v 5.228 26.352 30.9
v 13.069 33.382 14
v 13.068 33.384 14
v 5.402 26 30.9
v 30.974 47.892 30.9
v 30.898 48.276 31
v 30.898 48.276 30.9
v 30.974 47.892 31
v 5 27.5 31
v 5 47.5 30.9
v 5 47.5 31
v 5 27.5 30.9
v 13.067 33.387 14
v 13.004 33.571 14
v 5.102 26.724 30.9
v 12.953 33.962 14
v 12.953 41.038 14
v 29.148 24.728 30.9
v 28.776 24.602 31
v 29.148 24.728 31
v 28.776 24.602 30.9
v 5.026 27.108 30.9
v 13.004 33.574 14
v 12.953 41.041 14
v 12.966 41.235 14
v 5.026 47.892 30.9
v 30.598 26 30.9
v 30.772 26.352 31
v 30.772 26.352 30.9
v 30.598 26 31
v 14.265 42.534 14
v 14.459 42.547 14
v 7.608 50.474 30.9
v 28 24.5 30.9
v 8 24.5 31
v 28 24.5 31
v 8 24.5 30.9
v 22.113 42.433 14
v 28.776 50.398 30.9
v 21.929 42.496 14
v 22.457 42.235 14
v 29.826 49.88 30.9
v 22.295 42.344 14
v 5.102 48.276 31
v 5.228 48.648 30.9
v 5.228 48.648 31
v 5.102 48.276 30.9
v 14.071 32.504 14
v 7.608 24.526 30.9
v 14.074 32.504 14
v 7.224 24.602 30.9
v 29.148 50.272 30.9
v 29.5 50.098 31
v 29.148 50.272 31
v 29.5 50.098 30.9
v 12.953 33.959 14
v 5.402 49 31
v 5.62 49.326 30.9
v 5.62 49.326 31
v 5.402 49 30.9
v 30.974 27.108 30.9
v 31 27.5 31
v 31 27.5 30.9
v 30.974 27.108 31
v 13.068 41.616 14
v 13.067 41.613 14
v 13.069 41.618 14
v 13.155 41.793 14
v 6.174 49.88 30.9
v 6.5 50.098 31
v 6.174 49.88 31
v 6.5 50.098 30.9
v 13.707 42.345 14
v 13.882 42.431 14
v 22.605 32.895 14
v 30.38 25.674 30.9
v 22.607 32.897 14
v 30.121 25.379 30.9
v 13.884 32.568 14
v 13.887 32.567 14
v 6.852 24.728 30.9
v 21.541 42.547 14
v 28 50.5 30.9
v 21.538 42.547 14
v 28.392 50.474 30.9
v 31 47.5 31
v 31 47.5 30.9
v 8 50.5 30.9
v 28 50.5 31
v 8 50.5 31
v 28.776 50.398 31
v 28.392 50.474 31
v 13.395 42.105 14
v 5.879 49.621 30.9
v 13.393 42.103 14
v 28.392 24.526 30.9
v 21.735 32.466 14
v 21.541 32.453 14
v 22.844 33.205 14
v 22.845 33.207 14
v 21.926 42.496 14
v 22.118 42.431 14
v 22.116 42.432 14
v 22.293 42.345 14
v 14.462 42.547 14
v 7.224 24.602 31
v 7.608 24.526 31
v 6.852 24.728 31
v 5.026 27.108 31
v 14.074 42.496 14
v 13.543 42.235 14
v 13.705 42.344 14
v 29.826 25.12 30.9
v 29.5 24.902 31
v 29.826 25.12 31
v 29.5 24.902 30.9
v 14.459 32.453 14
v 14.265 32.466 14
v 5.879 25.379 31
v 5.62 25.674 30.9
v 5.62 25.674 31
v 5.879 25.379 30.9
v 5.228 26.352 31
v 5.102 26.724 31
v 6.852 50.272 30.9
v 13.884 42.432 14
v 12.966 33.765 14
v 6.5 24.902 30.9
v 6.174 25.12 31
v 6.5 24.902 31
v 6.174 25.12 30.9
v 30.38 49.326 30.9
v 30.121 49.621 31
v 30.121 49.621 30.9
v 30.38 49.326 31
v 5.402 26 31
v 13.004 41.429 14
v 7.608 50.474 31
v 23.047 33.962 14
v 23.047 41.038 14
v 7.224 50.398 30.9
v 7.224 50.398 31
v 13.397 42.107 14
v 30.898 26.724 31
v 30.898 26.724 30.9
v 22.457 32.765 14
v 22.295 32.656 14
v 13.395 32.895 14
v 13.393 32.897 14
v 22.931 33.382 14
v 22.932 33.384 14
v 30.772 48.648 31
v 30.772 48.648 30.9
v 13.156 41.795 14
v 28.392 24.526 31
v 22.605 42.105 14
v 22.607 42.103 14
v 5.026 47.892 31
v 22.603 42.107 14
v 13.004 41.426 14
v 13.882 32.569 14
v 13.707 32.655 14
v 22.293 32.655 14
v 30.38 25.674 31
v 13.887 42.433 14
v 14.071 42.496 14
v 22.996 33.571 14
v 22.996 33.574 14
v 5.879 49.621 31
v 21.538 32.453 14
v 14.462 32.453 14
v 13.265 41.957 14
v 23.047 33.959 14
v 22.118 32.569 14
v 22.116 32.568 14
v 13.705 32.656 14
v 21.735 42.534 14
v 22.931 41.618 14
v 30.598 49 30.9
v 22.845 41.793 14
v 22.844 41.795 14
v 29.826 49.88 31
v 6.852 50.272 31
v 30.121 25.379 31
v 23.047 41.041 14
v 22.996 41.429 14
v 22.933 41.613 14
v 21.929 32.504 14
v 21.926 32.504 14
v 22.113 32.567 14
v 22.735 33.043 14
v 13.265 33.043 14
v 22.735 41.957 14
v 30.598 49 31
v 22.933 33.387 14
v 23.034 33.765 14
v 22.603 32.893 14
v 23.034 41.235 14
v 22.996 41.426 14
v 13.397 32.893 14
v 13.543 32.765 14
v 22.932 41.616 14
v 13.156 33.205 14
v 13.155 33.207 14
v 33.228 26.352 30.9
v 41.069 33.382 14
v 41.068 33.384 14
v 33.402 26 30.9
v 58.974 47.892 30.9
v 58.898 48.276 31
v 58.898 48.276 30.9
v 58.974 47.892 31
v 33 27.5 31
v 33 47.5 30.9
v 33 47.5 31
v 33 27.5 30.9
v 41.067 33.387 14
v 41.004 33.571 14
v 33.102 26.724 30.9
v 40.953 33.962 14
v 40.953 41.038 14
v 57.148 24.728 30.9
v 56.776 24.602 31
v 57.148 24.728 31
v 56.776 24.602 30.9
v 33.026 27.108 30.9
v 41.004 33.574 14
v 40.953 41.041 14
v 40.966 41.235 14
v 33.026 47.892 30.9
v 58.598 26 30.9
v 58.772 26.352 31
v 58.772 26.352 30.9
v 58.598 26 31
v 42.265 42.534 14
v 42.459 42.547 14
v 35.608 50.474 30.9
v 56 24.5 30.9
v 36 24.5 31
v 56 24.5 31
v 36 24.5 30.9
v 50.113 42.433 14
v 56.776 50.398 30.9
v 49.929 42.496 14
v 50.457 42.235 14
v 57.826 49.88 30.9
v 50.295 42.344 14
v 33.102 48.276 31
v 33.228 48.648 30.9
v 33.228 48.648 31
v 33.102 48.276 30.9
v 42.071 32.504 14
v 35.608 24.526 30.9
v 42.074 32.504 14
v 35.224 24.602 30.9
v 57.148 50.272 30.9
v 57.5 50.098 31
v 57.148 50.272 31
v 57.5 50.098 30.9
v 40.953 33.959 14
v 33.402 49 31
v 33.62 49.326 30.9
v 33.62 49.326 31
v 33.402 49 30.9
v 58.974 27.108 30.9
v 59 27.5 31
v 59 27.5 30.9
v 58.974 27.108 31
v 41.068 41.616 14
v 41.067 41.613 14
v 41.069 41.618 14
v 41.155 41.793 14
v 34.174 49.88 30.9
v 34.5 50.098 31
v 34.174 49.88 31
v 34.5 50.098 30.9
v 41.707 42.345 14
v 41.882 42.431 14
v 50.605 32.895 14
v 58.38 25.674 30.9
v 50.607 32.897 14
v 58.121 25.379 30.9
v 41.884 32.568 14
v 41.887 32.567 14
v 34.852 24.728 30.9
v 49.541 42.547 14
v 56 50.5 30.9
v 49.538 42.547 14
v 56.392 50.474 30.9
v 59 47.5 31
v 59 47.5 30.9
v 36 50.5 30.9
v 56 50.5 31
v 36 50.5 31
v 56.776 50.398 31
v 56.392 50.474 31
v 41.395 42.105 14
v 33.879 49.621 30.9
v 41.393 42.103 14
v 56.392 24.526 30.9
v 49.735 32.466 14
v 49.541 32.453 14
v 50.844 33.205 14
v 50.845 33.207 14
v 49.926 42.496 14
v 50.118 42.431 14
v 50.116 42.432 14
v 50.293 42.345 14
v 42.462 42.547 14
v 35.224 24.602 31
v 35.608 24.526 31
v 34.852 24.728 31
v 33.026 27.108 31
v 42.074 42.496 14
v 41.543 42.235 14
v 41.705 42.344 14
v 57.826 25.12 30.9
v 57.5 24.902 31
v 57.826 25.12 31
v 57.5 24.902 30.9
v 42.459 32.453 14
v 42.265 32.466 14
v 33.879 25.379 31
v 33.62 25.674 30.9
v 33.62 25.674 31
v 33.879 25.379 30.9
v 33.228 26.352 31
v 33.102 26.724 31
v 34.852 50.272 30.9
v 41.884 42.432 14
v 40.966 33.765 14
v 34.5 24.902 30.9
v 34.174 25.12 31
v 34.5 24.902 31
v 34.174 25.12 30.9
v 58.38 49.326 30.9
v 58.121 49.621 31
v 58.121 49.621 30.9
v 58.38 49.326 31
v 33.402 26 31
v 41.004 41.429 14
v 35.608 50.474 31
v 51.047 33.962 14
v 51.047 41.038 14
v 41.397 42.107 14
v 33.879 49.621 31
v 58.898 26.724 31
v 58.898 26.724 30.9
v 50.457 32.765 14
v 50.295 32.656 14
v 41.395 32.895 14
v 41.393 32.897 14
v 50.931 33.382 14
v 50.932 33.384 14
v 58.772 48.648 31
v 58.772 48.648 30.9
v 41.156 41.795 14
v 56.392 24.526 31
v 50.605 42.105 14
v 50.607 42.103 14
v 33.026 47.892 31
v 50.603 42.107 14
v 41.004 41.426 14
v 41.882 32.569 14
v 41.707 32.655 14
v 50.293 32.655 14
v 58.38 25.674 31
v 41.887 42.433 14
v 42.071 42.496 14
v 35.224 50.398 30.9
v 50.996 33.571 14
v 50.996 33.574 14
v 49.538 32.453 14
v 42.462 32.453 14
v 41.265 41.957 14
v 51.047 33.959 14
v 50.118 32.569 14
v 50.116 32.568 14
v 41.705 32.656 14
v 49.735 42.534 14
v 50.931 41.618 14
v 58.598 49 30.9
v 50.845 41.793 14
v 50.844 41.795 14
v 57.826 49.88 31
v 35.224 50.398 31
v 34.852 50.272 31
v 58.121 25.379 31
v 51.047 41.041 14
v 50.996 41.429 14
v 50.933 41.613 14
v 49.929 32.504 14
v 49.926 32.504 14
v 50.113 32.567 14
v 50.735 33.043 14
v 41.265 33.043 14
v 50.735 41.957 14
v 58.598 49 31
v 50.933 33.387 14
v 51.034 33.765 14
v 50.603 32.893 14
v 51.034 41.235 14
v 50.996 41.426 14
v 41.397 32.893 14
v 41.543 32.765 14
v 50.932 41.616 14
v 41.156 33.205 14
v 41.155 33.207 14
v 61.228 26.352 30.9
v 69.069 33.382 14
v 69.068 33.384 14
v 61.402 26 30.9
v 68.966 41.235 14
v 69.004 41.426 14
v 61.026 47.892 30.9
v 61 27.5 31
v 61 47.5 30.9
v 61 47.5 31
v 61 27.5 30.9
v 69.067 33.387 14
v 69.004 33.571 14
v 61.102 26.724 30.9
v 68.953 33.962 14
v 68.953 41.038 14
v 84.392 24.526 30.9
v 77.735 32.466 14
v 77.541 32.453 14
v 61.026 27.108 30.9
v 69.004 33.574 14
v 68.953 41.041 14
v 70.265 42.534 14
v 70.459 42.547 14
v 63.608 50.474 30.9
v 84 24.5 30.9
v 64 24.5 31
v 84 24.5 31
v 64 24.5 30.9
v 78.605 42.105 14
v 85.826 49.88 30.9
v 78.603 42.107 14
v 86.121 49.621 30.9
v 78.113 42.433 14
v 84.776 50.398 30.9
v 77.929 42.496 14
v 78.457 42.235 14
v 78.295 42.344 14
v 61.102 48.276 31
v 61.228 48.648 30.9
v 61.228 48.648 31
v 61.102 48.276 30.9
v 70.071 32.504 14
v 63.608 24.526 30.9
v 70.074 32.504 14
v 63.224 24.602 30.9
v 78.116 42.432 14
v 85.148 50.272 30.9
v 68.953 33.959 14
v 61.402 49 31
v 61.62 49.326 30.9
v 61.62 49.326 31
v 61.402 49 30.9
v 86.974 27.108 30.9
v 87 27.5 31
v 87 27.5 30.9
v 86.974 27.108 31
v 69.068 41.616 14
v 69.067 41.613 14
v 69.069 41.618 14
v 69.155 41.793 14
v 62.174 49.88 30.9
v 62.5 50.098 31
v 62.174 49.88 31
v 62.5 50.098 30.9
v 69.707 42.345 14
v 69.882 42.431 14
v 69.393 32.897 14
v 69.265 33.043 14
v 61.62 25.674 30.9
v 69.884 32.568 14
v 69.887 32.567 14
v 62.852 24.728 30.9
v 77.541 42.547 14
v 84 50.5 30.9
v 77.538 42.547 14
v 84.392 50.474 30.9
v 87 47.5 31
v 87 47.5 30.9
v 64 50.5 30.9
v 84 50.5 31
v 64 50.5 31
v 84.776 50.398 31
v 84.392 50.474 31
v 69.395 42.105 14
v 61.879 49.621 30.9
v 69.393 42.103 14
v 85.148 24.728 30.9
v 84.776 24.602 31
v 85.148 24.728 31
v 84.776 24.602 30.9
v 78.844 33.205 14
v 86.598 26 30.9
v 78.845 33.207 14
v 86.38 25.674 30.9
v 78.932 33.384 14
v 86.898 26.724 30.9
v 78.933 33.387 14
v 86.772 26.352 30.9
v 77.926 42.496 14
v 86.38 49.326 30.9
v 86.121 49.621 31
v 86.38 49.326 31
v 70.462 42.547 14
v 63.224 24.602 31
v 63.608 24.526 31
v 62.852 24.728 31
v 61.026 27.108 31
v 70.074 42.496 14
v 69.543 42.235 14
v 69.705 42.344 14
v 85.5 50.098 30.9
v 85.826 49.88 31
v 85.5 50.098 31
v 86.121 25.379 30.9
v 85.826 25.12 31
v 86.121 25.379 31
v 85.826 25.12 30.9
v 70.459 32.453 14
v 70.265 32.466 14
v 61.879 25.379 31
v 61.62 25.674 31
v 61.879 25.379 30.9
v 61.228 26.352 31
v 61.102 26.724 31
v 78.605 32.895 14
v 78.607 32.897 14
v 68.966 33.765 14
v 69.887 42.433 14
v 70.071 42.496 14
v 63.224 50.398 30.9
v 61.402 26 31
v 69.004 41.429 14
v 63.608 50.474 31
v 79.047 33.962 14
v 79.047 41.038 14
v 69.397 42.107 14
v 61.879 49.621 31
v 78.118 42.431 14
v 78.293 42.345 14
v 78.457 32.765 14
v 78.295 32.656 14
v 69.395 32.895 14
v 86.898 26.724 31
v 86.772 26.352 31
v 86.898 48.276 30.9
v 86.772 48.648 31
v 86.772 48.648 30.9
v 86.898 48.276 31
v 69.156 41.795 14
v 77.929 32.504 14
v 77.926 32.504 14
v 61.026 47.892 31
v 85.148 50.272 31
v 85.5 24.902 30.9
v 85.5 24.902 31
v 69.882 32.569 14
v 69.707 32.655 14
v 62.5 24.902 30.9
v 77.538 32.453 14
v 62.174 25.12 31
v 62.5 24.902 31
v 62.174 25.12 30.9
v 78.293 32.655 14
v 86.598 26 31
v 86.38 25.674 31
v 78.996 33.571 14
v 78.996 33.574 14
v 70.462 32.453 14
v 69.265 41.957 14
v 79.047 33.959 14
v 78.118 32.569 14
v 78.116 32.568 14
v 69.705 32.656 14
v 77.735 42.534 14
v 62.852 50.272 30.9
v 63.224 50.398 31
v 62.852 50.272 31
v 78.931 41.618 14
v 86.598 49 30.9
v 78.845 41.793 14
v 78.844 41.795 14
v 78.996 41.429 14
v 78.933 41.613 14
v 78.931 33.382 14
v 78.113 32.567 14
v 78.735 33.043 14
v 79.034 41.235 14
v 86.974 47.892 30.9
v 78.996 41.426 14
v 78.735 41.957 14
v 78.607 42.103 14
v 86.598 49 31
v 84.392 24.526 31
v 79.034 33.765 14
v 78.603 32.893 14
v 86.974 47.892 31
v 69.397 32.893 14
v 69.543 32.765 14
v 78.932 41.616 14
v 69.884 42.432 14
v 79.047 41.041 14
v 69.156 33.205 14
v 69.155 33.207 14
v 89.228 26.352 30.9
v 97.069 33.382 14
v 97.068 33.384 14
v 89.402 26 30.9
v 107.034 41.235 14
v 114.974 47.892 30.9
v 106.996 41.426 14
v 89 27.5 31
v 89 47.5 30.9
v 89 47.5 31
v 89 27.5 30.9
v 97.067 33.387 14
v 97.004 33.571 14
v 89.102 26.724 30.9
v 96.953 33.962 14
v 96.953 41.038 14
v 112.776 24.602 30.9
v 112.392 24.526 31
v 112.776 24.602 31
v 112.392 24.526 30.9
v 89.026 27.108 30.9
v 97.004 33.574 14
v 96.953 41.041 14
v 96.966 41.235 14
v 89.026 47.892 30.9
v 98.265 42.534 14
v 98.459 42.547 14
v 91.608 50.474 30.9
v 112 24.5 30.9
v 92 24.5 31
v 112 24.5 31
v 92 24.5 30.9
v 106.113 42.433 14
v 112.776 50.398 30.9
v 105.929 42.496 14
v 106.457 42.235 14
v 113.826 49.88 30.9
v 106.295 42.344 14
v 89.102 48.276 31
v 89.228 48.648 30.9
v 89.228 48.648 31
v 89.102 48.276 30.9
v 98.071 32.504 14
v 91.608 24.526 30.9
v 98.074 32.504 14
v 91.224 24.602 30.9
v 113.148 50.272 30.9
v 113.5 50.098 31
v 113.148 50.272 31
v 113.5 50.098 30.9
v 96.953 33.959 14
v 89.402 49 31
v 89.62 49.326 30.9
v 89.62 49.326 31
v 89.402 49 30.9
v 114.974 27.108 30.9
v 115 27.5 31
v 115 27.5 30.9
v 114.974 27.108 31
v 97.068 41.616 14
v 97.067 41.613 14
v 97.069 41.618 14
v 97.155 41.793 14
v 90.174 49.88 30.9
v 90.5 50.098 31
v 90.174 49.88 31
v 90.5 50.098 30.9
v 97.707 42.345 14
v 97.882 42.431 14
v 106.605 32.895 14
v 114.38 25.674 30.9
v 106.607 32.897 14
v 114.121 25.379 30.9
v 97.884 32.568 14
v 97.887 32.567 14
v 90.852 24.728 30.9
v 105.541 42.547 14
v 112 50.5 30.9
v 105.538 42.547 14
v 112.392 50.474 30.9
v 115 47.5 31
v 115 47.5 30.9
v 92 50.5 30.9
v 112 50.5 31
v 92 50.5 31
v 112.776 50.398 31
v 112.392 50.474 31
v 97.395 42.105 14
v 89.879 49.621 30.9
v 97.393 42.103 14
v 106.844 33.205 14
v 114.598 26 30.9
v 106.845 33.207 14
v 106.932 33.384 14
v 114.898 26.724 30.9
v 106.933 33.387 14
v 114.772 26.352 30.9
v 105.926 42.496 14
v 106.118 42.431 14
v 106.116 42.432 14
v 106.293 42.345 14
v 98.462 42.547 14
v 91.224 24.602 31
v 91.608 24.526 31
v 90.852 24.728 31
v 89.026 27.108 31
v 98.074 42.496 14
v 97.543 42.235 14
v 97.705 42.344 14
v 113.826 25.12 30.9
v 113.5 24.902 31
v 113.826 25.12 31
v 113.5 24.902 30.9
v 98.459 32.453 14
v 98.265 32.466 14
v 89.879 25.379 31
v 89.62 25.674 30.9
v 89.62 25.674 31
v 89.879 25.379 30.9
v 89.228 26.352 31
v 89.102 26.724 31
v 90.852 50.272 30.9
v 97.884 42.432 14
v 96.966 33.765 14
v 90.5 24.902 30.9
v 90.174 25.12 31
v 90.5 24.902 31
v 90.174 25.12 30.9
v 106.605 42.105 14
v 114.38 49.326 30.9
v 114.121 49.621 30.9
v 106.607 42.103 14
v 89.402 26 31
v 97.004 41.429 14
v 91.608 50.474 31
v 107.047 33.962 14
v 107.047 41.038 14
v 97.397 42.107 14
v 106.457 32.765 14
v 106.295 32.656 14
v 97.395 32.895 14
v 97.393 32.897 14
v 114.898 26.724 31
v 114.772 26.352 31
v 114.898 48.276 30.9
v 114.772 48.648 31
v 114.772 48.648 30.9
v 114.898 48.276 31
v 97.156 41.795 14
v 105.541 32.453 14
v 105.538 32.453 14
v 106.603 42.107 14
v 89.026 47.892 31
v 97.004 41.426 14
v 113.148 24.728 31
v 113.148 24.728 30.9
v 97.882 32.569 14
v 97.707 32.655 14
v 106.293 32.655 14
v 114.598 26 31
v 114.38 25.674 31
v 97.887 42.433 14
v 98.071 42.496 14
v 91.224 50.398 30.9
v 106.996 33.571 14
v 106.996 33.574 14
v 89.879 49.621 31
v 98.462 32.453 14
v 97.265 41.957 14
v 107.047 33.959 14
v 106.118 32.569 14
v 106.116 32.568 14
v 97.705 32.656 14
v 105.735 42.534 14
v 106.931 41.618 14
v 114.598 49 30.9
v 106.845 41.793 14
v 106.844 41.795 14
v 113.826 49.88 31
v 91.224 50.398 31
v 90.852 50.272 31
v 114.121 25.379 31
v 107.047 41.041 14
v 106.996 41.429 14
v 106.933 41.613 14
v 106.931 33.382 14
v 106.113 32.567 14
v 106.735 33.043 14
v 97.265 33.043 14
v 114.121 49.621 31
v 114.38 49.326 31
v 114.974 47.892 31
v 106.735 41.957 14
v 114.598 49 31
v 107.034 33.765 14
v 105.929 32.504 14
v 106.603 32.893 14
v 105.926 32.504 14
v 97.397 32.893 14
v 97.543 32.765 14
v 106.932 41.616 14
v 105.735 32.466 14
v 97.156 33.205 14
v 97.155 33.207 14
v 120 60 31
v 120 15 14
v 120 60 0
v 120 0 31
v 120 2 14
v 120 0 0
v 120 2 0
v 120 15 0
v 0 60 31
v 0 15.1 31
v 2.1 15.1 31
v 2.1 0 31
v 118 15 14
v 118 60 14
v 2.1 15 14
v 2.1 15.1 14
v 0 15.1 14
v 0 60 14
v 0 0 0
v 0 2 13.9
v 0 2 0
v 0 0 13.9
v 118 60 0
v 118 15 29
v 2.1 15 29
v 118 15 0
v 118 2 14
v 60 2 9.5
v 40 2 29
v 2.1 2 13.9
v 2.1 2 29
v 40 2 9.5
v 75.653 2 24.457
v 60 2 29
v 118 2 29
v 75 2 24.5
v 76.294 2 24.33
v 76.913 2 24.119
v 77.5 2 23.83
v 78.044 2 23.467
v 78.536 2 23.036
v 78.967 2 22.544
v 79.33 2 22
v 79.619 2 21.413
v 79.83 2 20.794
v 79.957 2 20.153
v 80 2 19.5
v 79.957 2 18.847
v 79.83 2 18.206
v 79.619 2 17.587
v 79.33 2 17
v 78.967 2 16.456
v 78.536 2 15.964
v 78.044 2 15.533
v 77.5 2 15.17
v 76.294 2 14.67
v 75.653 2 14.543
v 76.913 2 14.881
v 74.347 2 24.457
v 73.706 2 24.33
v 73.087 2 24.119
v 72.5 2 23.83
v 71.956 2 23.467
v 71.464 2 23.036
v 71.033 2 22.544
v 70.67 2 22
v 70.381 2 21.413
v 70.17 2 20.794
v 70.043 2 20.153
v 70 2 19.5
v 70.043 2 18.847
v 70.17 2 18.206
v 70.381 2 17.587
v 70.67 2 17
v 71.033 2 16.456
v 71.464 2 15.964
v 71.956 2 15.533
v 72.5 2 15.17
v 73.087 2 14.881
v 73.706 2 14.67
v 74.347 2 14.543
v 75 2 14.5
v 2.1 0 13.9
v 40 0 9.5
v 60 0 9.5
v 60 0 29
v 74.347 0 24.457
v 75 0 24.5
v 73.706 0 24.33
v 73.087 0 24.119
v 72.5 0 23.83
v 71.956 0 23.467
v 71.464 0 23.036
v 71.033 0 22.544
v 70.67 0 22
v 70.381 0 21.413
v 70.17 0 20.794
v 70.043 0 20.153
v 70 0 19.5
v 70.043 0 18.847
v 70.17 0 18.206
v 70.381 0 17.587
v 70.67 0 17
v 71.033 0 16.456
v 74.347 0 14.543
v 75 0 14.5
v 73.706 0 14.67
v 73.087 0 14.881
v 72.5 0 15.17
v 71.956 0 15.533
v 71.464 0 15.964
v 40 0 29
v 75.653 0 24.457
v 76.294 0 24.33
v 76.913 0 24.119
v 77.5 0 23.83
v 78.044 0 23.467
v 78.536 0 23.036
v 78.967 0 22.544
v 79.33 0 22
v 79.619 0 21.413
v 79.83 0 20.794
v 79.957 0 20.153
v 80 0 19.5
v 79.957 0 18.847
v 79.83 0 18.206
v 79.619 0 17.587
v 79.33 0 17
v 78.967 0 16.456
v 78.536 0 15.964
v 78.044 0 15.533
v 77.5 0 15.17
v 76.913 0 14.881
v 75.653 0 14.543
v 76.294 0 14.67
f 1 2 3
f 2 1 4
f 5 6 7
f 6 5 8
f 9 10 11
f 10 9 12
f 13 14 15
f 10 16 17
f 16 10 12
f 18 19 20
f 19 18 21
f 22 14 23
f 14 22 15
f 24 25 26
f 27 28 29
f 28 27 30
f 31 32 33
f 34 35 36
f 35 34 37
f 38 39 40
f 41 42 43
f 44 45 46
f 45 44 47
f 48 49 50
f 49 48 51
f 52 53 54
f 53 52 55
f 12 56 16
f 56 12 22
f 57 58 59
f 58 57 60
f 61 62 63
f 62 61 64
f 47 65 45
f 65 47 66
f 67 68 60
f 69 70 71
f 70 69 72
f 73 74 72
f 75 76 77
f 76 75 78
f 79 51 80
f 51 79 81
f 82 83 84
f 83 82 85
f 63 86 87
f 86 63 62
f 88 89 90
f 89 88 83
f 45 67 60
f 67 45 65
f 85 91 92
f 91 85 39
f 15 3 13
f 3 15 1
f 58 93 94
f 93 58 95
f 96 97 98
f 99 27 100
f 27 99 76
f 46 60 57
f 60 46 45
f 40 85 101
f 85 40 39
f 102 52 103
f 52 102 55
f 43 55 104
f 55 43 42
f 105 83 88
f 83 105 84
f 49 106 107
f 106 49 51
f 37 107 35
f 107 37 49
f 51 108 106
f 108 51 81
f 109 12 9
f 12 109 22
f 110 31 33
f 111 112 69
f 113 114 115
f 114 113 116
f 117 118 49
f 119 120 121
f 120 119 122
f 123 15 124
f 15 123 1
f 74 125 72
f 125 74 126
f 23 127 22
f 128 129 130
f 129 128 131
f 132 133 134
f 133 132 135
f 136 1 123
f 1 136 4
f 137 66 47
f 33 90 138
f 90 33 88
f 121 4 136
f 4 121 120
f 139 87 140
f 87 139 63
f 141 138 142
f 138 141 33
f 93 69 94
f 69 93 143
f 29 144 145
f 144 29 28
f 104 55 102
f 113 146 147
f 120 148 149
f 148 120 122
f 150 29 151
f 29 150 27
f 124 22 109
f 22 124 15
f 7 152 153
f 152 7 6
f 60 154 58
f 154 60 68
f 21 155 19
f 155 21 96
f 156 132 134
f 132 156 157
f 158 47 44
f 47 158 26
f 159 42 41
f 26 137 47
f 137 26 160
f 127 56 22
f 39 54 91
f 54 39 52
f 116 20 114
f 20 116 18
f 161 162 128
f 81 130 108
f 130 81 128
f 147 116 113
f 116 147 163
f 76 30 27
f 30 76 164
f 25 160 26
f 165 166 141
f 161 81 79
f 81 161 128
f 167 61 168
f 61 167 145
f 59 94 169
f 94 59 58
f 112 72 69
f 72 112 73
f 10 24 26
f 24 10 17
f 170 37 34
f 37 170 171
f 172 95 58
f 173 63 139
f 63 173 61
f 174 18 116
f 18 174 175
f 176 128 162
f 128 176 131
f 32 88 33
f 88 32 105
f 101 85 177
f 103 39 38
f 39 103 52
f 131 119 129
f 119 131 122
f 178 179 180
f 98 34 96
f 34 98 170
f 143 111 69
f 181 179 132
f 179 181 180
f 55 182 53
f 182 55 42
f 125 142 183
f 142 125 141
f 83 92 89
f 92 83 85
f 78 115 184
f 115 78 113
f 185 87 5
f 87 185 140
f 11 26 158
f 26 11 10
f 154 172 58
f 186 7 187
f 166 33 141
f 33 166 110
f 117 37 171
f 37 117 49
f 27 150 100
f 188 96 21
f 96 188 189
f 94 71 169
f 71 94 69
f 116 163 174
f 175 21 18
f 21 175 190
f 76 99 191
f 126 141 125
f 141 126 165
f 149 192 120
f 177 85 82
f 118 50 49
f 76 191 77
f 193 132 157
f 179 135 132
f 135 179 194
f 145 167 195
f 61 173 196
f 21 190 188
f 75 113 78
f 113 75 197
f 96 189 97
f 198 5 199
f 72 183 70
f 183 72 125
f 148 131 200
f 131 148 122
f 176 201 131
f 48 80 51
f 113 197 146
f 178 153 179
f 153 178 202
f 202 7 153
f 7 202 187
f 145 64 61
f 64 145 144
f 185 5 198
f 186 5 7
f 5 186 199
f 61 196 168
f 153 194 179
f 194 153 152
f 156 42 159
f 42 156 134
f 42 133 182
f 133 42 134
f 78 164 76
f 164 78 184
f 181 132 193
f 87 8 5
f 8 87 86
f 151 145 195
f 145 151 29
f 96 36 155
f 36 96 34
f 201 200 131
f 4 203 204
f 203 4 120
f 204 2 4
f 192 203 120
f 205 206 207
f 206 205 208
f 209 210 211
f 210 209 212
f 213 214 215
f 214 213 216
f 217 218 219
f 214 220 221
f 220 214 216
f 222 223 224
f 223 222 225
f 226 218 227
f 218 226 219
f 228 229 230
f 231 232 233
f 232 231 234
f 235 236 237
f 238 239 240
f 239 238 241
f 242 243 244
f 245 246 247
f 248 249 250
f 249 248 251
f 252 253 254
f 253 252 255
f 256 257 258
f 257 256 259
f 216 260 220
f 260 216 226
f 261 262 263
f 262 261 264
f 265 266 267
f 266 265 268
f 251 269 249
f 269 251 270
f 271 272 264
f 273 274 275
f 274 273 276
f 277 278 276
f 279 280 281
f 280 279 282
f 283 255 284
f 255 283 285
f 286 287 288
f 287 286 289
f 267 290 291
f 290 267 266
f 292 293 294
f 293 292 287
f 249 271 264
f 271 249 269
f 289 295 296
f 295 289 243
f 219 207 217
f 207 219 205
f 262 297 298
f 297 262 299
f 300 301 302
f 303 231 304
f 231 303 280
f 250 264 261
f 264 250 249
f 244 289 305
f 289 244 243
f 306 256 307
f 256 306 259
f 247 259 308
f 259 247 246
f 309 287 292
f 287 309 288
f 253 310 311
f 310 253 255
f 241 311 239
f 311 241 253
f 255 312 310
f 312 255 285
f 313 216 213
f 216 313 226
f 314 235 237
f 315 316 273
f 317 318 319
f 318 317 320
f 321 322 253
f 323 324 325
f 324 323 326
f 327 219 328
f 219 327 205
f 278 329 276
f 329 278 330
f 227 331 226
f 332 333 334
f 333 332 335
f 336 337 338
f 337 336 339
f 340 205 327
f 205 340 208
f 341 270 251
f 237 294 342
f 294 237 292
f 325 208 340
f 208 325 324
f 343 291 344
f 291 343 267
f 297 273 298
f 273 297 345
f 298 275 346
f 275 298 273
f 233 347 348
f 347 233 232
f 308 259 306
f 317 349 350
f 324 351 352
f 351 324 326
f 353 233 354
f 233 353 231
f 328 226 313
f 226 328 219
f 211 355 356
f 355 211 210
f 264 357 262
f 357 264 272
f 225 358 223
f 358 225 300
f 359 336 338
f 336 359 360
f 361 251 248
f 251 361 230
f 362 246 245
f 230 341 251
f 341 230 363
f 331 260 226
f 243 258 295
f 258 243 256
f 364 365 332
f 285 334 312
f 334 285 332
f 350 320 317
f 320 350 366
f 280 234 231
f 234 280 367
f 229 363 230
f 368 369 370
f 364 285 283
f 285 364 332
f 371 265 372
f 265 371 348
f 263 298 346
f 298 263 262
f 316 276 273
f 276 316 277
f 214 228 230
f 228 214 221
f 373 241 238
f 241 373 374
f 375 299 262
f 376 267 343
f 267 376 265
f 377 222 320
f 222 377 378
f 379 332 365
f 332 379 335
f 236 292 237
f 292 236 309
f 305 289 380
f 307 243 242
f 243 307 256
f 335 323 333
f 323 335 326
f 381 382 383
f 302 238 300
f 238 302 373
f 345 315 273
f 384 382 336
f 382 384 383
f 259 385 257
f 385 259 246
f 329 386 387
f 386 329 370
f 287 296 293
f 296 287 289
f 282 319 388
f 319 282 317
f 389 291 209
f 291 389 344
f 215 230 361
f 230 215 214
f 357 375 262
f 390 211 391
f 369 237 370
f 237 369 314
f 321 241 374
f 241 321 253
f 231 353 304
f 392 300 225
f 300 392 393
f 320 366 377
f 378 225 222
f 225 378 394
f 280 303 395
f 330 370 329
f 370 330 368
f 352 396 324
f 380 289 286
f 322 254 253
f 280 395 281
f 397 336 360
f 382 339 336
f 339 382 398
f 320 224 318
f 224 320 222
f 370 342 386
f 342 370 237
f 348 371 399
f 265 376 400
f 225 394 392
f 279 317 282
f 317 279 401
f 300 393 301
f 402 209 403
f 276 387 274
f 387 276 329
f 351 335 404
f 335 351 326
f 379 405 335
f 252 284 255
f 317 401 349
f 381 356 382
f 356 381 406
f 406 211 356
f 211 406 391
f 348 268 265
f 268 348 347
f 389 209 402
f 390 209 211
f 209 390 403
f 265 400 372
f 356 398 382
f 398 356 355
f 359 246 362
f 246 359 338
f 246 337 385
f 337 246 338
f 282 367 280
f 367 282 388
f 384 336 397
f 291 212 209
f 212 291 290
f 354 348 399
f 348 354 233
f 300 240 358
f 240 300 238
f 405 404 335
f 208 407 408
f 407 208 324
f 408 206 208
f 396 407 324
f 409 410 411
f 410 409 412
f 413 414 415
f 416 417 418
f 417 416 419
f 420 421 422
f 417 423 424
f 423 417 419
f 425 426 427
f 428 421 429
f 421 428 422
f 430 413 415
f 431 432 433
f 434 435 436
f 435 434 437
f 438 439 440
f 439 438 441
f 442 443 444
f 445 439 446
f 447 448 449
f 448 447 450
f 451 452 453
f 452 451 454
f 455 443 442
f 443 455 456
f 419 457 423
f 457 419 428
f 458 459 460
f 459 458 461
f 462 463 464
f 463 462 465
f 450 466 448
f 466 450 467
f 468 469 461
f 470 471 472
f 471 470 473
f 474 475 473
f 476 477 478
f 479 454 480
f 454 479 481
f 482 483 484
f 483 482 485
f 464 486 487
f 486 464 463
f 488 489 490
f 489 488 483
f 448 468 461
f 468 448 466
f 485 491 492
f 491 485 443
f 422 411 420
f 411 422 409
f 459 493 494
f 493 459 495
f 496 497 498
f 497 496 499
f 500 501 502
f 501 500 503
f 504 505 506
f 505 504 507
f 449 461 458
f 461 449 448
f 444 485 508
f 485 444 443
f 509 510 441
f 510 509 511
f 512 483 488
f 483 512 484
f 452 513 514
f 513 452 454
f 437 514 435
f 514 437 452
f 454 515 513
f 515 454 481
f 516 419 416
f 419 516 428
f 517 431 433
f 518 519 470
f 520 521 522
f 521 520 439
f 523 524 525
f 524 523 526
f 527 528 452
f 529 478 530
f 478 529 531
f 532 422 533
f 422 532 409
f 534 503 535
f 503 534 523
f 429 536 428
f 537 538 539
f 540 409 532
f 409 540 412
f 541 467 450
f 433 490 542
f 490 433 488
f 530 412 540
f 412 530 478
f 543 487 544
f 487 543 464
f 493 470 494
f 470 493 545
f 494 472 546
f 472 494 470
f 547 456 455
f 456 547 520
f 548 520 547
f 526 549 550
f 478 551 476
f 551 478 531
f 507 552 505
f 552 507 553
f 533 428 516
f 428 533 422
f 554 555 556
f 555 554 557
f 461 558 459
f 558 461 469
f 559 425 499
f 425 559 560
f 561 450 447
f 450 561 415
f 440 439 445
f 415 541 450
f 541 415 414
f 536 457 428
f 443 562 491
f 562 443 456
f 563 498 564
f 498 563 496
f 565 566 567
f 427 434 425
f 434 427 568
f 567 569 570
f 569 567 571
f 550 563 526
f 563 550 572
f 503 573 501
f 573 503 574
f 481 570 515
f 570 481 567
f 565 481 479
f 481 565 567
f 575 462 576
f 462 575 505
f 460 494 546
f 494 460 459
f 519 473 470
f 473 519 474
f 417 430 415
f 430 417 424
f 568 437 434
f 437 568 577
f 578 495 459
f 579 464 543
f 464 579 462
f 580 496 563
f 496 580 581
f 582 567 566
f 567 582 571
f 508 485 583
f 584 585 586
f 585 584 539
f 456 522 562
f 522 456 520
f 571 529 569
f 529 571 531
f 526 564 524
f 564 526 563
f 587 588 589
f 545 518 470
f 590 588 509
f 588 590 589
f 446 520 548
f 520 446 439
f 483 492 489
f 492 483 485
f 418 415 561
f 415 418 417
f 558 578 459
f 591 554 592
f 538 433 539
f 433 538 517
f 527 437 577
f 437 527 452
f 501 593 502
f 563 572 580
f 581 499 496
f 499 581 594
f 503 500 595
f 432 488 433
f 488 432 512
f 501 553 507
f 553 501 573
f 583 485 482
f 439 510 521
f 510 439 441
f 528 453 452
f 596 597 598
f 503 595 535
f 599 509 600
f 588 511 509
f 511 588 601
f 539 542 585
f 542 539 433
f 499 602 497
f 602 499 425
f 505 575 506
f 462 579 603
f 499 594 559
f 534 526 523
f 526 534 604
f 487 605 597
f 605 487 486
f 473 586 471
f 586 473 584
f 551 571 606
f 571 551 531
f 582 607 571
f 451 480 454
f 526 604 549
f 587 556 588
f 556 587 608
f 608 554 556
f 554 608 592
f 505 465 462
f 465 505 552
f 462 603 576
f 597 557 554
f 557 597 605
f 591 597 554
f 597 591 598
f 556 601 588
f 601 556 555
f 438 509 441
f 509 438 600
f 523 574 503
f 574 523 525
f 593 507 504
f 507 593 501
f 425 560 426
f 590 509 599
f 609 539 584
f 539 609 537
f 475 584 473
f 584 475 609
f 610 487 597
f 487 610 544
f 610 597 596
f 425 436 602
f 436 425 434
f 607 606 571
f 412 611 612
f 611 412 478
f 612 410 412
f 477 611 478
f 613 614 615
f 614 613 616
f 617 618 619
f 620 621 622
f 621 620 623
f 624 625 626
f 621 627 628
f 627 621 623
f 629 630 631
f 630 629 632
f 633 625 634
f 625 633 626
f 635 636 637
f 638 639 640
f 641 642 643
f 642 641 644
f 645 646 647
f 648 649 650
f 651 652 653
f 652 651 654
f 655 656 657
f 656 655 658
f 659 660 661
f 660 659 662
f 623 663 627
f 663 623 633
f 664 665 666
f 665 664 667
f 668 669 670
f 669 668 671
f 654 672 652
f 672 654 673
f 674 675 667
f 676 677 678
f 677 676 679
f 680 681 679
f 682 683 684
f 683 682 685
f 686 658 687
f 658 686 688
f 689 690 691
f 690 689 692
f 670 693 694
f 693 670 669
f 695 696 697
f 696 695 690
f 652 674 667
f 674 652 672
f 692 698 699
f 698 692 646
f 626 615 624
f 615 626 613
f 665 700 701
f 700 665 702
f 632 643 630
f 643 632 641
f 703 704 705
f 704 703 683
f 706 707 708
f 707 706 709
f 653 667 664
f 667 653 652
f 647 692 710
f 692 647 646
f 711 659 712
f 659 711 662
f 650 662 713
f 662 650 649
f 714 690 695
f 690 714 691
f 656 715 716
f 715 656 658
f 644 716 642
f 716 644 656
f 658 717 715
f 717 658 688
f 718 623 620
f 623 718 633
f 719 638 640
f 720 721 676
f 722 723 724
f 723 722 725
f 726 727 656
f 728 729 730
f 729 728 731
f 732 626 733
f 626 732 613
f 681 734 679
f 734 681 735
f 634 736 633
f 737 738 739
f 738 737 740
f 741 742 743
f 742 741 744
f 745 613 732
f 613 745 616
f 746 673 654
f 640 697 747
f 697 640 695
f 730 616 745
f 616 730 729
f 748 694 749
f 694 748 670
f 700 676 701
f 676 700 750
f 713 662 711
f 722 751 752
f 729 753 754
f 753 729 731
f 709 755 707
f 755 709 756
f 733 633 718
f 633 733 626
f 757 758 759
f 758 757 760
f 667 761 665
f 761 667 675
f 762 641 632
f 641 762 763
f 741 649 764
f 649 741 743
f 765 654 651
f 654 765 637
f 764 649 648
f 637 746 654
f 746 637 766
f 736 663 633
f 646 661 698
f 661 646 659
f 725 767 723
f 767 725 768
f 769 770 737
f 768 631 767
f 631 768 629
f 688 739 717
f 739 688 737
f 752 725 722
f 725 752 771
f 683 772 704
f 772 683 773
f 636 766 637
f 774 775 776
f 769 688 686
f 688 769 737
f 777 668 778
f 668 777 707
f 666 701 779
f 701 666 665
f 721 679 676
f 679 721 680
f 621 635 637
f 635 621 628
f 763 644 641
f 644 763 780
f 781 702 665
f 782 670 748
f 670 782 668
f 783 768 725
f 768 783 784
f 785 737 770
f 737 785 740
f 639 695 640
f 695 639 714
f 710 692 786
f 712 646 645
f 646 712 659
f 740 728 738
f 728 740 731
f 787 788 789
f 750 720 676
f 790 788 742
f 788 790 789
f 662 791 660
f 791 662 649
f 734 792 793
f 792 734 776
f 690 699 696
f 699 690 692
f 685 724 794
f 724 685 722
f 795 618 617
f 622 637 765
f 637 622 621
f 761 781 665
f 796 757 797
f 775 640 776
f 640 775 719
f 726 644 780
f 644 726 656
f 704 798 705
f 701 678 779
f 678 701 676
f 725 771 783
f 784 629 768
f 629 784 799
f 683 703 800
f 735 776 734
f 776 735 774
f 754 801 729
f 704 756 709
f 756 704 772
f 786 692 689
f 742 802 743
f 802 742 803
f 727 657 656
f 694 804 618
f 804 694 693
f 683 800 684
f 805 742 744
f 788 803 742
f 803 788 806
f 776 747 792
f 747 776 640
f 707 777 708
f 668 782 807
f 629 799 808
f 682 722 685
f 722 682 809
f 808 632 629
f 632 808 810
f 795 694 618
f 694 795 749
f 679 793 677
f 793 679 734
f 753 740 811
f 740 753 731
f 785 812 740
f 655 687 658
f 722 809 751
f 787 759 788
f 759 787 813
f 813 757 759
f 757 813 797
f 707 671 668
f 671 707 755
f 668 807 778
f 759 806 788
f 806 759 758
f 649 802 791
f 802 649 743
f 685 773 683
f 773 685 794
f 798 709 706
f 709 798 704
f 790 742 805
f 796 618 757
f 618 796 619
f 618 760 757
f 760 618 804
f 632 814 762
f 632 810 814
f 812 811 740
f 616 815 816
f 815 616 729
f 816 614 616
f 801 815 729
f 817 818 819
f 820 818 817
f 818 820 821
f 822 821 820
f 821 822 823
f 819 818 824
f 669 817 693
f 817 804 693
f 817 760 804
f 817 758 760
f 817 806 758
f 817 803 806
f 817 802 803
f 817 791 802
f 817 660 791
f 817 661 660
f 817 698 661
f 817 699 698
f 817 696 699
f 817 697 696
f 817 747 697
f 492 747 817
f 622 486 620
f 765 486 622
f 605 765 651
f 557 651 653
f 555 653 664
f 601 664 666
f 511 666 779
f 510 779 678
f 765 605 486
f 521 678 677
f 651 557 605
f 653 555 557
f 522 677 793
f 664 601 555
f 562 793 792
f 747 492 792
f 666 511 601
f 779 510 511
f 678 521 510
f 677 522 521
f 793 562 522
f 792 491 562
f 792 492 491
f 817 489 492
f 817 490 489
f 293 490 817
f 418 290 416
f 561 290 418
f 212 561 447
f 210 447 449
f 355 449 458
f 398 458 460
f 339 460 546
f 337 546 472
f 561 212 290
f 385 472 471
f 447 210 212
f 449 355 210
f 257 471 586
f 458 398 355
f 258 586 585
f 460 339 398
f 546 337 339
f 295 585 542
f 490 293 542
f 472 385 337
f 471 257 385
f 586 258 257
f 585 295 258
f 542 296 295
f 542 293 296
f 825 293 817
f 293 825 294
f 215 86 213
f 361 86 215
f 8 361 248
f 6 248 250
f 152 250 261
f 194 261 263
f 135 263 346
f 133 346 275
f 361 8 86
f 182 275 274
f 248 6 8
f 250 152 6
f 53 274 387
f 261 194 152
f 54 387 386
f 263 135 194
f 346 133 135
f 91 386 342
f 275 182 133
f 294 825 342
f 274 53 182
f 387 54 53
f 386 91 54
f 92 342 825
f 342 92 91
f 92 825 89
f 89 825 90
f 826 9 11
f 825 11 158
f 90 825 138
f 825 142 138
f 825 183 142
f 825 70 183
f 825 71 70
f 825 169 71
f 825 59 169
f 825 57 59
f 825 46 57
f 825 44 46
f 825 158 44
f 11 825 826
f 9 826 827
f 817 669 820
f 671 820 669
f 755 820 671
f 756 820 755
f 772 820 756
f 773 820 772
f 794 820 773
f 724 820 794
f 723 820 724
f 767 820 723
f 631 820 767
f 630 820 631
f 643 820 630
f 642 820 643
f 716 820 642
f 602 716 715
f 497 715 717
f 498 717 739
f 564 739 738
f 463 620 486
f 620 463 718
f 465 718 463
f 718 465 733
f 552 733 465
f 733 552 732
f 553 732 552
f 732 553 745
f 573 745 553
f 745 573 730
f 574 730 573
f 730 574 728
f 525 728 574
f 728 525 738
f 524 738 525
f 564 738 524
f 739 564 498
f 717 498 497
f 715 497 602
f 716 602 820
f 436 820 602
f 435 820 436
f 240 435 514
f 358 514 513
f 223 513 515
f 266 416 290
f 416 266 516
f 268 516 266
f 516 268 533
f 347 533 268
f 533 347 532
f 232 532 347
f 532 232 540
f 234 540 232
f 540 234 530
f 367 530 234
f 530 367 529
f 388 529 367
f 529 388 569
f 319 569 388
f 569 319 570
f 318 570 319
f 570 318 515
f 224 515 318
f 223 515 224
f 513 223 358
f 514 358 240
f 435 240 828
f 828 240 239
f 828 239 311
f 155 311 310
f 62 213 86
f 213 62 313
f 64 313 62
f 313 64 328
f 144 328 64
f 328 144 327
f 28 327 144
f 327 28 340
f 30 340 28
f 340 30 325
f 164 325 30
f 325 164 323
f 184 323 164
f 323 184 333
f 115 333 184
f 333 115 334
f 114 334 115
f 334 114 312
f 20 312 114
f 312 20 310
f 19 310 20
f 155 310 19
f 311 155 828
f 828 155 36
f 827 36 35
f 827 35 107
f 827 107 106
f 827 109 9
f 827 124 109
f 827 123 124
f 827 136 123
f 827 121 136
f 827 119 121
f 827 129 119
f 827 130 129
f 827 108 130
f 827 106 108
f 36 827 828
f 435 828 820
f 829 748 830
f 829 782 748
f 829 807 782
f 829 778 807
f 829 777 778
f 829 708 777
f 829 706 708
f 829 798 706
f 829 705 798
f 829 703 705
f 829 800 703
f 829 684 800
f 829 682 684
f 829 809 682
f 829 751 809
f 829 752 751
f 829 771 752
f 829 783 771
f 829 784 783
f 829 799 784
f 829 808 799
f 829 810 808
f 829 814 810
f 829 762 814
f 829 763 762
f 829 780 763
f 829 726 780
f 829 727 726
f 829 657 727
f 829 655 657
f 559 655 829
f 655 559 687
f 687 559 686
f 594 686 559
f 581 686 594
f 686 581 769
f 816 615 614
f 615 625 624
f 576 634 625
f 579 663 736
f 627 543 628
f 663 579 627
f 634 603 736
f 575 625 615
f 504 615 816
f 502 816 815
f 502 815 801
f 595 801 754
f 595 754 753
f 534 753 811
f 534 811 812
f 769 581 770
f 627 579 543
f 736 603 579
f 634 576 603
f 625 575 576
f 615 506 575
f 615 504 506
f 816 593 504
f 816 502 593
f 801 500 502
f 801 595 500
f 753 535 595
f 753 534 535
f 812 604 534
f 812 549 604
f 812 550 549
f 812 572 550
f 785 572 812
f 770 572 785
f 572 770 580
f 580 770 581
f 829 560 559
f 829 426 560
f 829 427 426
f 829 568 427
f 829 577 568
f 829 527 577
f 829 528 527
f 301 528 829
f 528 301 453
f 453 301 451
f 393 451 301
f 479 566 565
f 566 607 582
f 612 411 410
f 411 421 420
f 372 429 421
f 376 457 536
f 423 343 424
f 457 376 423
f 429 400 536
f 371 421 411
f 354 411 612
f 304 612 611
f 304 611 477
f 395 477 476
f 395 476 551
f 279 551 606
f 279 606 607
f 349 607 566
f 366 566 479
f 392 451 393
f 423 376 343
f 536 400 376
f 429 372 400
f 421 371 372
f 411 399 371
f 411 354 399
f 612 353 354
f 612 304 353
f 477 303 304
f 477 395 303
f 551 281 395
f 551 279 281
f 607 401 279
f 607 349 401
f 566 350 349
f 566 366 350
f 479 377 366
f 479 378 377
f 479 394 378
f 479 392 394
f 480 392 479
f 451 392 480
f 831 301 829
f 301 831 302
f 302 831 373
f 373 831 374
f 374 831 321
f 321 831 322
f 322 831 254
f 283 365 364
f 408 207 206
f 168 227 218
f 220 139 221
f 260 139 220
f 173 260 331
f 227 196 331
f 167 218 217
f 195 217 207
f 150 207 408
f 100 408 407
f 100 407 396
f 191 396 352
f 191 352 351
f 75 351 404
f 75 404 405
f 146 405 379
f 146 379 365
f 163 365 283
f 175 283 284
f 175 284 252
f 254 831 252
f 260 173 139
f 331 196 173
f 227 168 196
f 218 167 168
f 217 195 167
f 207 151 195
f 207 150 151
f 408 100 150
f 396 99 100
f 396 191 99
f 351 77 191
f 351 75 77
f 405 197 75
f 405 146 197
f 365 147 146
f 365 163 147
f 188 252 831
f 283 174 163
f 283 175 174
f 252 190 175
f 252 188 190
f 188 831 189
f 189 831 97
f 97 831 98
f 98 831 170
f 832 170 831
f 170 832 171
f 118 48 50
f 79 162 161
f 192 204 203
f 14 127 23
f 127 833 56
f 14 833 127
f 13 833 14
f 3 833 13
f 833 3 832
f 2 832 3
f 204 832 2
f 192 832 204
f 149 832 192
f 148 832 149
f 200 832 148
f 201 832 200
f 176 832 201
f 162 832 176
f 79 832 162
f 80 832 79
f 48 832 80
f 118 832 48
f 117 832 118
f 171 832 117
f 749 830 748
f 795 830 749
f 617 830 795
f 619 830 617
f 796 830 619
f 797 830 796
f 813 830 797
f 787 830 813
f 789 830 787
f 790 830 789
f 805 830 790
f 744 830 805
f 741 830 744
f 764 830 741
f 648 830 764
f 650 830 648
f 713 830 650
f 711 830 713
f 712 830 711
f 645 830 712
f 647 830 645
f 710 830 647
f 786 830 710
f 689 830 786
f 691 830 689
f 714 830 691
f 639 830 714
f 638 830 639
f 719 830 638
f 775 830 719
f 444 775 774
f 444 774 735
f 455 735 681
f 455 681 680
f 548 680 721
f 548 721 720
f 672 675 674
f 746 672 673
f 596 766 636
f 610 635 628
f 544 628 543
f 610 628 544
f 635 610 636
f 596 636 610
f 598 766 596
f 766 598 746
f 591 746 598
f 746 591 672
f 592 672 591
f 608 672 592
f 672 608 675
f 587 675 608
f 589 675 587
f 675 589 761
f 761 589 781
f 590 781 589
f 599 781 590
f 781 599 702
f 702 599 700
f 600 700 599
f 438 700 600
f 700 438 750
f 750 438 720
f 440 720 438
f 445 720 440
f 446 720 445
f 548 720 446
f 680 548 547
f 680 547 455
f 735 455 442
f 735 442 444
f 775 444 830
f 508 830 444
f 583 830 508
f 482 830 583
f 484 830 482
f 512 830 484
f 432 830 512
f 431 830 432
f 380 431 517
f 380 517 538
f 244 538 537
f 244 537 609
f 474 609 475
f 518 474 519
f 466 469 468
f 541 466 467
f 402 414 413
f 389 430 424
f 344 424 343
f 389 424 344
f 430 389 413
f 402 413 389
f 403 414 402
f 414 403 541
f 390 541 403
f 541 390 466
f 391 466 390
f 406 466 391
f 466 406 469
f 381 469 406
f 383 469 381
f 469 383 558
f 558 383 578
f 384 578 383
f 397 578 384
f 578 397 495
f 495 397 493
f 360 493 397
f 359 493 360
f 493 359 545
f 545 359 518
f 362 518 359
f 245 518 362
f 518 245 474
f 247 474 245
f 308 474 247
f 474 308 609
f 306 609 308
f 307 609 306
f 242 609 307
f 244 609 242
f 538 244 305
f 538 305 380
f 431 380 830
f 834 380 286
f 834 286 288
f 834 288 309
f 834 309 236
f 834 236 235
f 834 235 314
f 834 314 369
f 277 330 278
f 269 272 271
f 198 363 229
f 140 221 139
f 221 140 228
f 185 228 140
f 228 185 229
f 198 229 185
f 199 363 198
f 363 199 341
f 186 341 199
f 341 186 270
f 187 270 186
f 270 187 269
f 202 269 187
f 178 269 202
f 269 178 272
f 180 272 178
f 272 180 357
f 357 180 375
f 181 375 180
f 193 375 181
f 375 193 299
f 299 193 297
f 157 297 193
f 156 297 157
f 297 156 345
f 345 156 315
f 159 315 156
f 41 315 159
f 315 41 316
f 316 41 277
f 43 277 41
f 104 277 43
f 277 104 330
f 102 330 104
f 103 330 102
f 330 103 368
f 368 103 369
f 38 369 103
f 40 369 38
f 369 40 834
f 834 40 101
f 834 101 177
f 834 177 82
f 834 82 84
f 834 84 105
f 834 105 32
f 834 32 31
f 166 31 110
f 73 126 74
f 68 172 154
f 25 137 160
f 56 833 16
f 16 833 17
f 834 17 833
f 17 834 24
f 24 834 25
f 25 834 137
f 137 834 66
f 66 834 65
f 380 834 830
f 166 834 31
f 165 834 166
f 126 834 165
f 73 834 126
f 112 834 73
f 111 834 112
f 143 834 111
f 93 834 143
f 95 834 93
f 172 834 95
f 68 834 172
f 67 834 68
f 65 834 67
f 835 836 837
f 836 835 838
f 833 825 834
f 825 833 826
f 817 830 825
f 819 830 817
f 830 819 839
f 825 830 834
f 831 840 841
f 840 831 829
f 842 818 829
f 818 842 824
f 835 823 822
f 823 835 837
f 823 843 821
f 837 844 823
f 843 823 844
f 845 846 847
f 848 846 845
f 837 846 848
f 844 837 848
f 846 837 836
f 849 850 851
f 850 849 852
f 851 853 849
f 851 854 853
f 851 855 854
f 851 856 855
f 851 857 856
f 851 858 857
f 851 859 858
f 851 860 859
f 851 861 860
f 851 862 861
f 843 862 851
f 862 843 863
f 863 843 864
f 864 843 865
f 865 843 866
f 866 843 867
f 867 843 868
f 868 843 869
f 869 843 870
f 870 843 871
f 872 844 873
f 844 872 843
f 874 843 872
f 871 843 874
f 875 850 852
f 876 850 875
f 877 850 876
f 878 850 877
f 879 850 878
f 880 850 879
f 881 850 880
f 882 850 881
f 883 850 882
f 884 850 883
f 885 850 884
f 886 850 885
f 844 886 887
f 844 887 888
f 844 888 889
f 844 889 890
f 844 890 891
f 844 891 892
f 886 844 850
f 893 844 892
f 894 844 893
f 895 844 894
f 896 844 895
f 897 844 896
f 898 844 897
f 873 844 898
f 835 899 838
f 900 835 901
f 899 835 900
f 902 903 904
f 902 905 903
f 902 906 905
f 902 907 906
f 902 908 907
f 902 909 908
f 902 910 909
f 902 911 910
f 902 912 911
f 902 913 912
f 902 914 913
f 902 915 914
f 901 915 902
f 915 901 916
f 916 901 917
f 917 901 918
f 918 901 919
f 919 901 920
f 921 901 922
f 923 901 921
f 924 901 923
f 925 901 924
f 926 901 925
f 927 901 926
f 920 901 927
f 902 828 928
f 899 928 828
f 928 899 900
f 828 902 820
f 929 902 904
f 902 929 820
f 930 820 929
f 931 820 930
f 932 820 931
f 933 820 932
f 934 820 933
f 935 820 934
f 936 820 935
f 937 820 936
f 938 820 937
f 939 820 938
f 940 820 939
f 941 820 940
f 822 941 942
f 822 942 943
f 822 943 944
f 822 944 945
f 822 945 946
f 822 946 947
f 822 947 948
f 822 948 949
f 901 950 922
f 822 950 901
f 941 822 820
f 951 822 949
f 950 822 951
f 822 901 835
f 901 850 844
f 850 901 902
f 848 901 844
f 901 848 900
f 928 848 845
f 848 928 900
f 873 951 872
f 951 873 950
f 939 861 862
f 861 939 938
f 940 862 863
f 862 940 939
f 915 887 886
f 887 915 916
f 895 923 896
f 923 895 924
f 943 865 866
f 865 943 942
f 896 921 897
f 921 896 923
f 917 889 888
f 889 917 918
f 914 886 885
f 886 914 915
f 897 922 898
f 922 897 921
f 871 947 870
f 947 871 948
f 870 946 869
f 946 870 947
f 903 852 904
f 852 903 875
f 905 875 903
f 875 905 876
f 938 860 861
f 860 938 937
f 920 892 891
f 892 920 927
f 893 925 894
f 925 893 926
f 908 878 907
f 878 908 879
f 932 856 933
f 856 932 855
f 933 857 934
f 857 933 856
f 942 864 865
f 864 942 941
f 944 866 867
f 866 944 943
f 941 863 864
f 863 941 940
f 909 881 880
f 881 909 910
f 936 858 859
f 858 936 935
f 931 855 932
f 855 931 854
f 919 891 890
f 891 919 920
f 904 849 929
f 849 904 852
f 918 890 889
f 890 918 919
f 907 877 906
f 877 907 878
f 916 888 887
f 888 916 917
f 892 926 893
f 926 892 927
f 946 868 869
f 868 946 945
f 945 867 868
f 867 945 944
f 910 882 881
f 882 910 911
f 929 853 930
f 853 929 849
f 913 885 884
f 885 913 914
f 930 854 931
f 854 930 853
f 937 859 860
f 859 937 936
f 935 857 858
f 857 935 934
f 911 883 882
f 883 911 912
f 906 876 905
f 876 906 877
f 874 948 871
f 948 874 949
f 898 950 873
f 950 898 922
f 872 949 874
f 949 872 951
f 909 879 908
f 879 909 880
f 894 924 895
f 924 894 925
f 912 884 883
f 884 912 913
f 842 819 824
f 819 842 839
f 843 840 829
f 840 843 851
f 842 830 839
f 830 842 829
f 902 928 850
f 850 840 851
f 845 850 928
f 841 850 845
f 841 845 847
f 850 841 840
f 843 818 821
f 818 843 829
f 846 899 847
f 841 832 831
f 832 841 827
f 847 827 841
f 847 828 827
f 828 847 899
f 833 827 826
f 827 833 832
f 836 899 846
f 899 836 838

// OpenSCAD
// Smart Pill Box Prototype v2
// Clean restart: rack_frame first
// OpenSCAD units: mm

part = "tray_shell";

$fn = 48;

// ------------------------------------------------------------
// Main dimensions
// ------------------------------------------------------------
case_w = 120;
case_d = 60;

wall = 2;

plate_th = 2;
gap_12 = 10;
gap_23 = 6;

upper_inset = 15;
upper_len = 45;
front_slot_w = 18;
front_slot_margin = 8;
top_hole = 15;
top_hole_y = upper_inset + (upper_len - top_hole) / 2;
tray_h = 17;
channel_roof_th = 2;
pill_open = 26;
pill_bottom_open = 10;
pill_center_y = top_hole_y + top_hole / 2;
pill_gap = 2;
pill_group_w = pill_open * 4 + pill_gap * 3;
pill_start_x = (case_w - pill_group_w) / 2;
pill_centers_x = [for (i = [0:3]) pill_start_x + pill_open / 2 + i * (pill_open + pill_gap)];
top_hole_xs = [for (cx = pill_centers_x) cx - top_hole / 2];
ui_square = 20;
ui_button_d = 10;
ui_gap = 10;
ui_group_w = ui_square + ui_gap + ui_button_d;
ui_square_x = (case_w - ui_group_w) / 2;
ui_square_z = (plate_th + gap_12 + plate_th + gap_23 + plate_th + tray_h - ui_square) / 2;
ui_button_x = ui_square_x + ui_square + ui_gap + ui_button_d / 2;
ui_button_z = ui_square_z + ui_square / 2;
cover_face_th = 1.6;
cover_lip_th = 2;
cover_clearance = 0.3;

// ------------------------------------------------------------
// Helpers
// ------------------------------------------------------------
module rounded_box(size, r = 0) {
    cube(size);
}

module square_pocket(cx, cy, top_size, depth) {
    translate([cx - top_size / 2, cy - top_size / 2, -0.1])
        cube([top_size, top_size, tray_h + 0.2]);
}

module rounded_square_2d(size, r) {
    hull() {
        for (x = [-size / 2 + r, size / 2 - r])
            for (y = [-size / 2 + r, size / 2 - r])
                translate([x, y])
                    circle(r = r);
    }
}

module funnel_hole(cx, cy, top_size, bottom_size) {
    translate([cx, cy, 0])
        hull() {
            translate([0, 0, tray_h - 0.1])
                linear_extrude(height = 0.2)
                    rounded_square_2d(top_size, 3);

            translate([0, 0, -0.1])
                linear_extrude(height = 0.2)
                    rounded_square_2d(bottom_size, 1.5);
        }
}

module finish_cover(open_w, open_h, face_margin = 1.5) {
    face_w = open_w + face_margin * 2;
    face_h = open_h + face_margin * 2;
    lip_w = max(0.1, open_w - cover_clearance * 2);
    lip_h = max(0.1, open_h - cover_clearance * 2);

    union() {
        cube([face_w, face_h, cover_face_th]);
        translate([(face_w - lip_w) / 2, (face_h - lip_h) / 2, cover_face_th])
            cube([lip_w, lip_h, cover_lip_th]);
    }
}

function shelf2_z() = plate_th + gap_12;
function rack_h() = shelf2_z() + plate_th;
function assembly_h() = rack_h() + tray_h;

// ------------------------------------------------------------
// Rack frame
// ------------------------------------------------------------
module rack_frame() {
    shelf2 = shelf2_z();
    frame_wall_h = rack_h();

    union() {
        // Bottom plate
        rounded_box([case_w, case_d, plate_th]);

        // Second floor plate
        translate([0, upper_inset, shelf2])
            rounded_box([case_w, upper_len, plate_th]);

        // Left outer wall
        rounded_box([wall, case_d, frame_wall_h]);

        // Right outer wall
        translate([case_w - wall, 0, 0])
            rounded_box([wall, case_d, frame_wall_h]);

        // Rear outer wall
        translate([0, case_d - wall, 0])
            rounded_box([case_w, wall, frame_wall_h]);
    }
}

// ------------------------------------------------------------
// Pill tray
// ------------------------------------------------------------
module pill_tray() {
    difference() {
        translate([0, upper_inset, 0])
            rounded_box([case_w, upper_len, tray_h]);

        for (cx = pill_centers_x)
            funnel_hole(cx, pill_center_y, pill_open, pill_bottom_open);
    }
}

module tray_shell() {
    total_h = rack_h();
    full_h = assembly_h();
    side_open_z0 = shelf2_z() + plate_th + 1;
    side_open_h = max(1, full_h - channel_roof_th - side_open_z0 - 1);

    difference() {
        union() {
            // Pill tray body
            translate([0, 0, total_h])
                pill_tray();

            // Right side outer wall
            translate([case_w - wall, upper_inset, 0])
                rounded_box([wall, case_d - upper_inset, full_h]);

            // Front face with UI openings
            difference() {
                rounded_box([case_w, wall, full_h]);

                translate([ui_square_x, -0.1, ui_square_z])
                    cube([ui_square, wall + 0.2, ui_square]);

                translate([ui_button_x, wall / 2, ui_button_z])
                    rotate([90, 0, 0])
                        cylinder(h = wall + 0.2, d = ui_button_d, center = true);
            }

            // Thin roof over the front service channel
            translate([0, 0, full_h - channel_roof_th])
                rounded_box([case_w, upper_inset, channel_roof_th]);

            // Close the visible right-side upper gap
            translate([case_w - wall, 0, shelf2_z() + plate_th])
                rounded_box([wall, upper_inset, full_h - channel_roof_th - (shelf2_z() + plate_th)]);
        }

        // Left side rectangular opening on tray_shell
        translate([-0.1, -0.1, side_open_z0])
            cube([wall + 0.2, upper_inset + 0.2, side_open_h]);

        // Remove the remaining left-side tray_shell U-frame all the way to the front edge
        translate([-0.1, -0.1, shelf2_z() + plate_th - 0.1])
            cube([wall + 0.2, upper_inset + 0.2, full_h - (shelf2_z() + plate_th) + 0.2]);

    }
}

// ------------------------------------------------------------
// Assembly
// ------------------------------------------------------------
module assembly() {
    color("#d9d9d9") rack_frame();
    color("#cfcfcf") tray_shell();
}

module cover_set() {
    shelf2_z = plate_th + gap_12;
    shelf3_z = plate_th + gap_12 + plate_th + gap_23;
    total_h = shelf3_z + plate_th;
    assembly_h = total_h + tray_h;

    long_open_w = case_w - wall * 2;
    long_open_h = gap_12;
    end_open_w = upper_inset - wall;
    end_open_h = assembly_h - channel_roof_th - plate_th;

    color("#d9d9d9") {
        finish_cover(long_open_w, long_open_h);

        translate([0, 20, 0])
            finish_cover(end_open_w, end_open_h);

        translate([20, 20, 0])
            finish_cover(end_open_w, end_open_h);
    }
}

// ------------------------------------------------------------
// Output
// ------------------------------------------------------------
if (part == "rack_frame") {
    color("#d9d9d9") rack_frame();
} else if (part == "pill_tray") {
    color("#d9d9d9") pill_tray();
} else if (part == "tray_shell") {
    color("#d9d9d9") tray_shell();
} else if (part == "assembly") {
    assembly();
} else if (part == "cover_set") {
    cover_set();
} else {
    color("#d9d9d9") rack_frame();
}
